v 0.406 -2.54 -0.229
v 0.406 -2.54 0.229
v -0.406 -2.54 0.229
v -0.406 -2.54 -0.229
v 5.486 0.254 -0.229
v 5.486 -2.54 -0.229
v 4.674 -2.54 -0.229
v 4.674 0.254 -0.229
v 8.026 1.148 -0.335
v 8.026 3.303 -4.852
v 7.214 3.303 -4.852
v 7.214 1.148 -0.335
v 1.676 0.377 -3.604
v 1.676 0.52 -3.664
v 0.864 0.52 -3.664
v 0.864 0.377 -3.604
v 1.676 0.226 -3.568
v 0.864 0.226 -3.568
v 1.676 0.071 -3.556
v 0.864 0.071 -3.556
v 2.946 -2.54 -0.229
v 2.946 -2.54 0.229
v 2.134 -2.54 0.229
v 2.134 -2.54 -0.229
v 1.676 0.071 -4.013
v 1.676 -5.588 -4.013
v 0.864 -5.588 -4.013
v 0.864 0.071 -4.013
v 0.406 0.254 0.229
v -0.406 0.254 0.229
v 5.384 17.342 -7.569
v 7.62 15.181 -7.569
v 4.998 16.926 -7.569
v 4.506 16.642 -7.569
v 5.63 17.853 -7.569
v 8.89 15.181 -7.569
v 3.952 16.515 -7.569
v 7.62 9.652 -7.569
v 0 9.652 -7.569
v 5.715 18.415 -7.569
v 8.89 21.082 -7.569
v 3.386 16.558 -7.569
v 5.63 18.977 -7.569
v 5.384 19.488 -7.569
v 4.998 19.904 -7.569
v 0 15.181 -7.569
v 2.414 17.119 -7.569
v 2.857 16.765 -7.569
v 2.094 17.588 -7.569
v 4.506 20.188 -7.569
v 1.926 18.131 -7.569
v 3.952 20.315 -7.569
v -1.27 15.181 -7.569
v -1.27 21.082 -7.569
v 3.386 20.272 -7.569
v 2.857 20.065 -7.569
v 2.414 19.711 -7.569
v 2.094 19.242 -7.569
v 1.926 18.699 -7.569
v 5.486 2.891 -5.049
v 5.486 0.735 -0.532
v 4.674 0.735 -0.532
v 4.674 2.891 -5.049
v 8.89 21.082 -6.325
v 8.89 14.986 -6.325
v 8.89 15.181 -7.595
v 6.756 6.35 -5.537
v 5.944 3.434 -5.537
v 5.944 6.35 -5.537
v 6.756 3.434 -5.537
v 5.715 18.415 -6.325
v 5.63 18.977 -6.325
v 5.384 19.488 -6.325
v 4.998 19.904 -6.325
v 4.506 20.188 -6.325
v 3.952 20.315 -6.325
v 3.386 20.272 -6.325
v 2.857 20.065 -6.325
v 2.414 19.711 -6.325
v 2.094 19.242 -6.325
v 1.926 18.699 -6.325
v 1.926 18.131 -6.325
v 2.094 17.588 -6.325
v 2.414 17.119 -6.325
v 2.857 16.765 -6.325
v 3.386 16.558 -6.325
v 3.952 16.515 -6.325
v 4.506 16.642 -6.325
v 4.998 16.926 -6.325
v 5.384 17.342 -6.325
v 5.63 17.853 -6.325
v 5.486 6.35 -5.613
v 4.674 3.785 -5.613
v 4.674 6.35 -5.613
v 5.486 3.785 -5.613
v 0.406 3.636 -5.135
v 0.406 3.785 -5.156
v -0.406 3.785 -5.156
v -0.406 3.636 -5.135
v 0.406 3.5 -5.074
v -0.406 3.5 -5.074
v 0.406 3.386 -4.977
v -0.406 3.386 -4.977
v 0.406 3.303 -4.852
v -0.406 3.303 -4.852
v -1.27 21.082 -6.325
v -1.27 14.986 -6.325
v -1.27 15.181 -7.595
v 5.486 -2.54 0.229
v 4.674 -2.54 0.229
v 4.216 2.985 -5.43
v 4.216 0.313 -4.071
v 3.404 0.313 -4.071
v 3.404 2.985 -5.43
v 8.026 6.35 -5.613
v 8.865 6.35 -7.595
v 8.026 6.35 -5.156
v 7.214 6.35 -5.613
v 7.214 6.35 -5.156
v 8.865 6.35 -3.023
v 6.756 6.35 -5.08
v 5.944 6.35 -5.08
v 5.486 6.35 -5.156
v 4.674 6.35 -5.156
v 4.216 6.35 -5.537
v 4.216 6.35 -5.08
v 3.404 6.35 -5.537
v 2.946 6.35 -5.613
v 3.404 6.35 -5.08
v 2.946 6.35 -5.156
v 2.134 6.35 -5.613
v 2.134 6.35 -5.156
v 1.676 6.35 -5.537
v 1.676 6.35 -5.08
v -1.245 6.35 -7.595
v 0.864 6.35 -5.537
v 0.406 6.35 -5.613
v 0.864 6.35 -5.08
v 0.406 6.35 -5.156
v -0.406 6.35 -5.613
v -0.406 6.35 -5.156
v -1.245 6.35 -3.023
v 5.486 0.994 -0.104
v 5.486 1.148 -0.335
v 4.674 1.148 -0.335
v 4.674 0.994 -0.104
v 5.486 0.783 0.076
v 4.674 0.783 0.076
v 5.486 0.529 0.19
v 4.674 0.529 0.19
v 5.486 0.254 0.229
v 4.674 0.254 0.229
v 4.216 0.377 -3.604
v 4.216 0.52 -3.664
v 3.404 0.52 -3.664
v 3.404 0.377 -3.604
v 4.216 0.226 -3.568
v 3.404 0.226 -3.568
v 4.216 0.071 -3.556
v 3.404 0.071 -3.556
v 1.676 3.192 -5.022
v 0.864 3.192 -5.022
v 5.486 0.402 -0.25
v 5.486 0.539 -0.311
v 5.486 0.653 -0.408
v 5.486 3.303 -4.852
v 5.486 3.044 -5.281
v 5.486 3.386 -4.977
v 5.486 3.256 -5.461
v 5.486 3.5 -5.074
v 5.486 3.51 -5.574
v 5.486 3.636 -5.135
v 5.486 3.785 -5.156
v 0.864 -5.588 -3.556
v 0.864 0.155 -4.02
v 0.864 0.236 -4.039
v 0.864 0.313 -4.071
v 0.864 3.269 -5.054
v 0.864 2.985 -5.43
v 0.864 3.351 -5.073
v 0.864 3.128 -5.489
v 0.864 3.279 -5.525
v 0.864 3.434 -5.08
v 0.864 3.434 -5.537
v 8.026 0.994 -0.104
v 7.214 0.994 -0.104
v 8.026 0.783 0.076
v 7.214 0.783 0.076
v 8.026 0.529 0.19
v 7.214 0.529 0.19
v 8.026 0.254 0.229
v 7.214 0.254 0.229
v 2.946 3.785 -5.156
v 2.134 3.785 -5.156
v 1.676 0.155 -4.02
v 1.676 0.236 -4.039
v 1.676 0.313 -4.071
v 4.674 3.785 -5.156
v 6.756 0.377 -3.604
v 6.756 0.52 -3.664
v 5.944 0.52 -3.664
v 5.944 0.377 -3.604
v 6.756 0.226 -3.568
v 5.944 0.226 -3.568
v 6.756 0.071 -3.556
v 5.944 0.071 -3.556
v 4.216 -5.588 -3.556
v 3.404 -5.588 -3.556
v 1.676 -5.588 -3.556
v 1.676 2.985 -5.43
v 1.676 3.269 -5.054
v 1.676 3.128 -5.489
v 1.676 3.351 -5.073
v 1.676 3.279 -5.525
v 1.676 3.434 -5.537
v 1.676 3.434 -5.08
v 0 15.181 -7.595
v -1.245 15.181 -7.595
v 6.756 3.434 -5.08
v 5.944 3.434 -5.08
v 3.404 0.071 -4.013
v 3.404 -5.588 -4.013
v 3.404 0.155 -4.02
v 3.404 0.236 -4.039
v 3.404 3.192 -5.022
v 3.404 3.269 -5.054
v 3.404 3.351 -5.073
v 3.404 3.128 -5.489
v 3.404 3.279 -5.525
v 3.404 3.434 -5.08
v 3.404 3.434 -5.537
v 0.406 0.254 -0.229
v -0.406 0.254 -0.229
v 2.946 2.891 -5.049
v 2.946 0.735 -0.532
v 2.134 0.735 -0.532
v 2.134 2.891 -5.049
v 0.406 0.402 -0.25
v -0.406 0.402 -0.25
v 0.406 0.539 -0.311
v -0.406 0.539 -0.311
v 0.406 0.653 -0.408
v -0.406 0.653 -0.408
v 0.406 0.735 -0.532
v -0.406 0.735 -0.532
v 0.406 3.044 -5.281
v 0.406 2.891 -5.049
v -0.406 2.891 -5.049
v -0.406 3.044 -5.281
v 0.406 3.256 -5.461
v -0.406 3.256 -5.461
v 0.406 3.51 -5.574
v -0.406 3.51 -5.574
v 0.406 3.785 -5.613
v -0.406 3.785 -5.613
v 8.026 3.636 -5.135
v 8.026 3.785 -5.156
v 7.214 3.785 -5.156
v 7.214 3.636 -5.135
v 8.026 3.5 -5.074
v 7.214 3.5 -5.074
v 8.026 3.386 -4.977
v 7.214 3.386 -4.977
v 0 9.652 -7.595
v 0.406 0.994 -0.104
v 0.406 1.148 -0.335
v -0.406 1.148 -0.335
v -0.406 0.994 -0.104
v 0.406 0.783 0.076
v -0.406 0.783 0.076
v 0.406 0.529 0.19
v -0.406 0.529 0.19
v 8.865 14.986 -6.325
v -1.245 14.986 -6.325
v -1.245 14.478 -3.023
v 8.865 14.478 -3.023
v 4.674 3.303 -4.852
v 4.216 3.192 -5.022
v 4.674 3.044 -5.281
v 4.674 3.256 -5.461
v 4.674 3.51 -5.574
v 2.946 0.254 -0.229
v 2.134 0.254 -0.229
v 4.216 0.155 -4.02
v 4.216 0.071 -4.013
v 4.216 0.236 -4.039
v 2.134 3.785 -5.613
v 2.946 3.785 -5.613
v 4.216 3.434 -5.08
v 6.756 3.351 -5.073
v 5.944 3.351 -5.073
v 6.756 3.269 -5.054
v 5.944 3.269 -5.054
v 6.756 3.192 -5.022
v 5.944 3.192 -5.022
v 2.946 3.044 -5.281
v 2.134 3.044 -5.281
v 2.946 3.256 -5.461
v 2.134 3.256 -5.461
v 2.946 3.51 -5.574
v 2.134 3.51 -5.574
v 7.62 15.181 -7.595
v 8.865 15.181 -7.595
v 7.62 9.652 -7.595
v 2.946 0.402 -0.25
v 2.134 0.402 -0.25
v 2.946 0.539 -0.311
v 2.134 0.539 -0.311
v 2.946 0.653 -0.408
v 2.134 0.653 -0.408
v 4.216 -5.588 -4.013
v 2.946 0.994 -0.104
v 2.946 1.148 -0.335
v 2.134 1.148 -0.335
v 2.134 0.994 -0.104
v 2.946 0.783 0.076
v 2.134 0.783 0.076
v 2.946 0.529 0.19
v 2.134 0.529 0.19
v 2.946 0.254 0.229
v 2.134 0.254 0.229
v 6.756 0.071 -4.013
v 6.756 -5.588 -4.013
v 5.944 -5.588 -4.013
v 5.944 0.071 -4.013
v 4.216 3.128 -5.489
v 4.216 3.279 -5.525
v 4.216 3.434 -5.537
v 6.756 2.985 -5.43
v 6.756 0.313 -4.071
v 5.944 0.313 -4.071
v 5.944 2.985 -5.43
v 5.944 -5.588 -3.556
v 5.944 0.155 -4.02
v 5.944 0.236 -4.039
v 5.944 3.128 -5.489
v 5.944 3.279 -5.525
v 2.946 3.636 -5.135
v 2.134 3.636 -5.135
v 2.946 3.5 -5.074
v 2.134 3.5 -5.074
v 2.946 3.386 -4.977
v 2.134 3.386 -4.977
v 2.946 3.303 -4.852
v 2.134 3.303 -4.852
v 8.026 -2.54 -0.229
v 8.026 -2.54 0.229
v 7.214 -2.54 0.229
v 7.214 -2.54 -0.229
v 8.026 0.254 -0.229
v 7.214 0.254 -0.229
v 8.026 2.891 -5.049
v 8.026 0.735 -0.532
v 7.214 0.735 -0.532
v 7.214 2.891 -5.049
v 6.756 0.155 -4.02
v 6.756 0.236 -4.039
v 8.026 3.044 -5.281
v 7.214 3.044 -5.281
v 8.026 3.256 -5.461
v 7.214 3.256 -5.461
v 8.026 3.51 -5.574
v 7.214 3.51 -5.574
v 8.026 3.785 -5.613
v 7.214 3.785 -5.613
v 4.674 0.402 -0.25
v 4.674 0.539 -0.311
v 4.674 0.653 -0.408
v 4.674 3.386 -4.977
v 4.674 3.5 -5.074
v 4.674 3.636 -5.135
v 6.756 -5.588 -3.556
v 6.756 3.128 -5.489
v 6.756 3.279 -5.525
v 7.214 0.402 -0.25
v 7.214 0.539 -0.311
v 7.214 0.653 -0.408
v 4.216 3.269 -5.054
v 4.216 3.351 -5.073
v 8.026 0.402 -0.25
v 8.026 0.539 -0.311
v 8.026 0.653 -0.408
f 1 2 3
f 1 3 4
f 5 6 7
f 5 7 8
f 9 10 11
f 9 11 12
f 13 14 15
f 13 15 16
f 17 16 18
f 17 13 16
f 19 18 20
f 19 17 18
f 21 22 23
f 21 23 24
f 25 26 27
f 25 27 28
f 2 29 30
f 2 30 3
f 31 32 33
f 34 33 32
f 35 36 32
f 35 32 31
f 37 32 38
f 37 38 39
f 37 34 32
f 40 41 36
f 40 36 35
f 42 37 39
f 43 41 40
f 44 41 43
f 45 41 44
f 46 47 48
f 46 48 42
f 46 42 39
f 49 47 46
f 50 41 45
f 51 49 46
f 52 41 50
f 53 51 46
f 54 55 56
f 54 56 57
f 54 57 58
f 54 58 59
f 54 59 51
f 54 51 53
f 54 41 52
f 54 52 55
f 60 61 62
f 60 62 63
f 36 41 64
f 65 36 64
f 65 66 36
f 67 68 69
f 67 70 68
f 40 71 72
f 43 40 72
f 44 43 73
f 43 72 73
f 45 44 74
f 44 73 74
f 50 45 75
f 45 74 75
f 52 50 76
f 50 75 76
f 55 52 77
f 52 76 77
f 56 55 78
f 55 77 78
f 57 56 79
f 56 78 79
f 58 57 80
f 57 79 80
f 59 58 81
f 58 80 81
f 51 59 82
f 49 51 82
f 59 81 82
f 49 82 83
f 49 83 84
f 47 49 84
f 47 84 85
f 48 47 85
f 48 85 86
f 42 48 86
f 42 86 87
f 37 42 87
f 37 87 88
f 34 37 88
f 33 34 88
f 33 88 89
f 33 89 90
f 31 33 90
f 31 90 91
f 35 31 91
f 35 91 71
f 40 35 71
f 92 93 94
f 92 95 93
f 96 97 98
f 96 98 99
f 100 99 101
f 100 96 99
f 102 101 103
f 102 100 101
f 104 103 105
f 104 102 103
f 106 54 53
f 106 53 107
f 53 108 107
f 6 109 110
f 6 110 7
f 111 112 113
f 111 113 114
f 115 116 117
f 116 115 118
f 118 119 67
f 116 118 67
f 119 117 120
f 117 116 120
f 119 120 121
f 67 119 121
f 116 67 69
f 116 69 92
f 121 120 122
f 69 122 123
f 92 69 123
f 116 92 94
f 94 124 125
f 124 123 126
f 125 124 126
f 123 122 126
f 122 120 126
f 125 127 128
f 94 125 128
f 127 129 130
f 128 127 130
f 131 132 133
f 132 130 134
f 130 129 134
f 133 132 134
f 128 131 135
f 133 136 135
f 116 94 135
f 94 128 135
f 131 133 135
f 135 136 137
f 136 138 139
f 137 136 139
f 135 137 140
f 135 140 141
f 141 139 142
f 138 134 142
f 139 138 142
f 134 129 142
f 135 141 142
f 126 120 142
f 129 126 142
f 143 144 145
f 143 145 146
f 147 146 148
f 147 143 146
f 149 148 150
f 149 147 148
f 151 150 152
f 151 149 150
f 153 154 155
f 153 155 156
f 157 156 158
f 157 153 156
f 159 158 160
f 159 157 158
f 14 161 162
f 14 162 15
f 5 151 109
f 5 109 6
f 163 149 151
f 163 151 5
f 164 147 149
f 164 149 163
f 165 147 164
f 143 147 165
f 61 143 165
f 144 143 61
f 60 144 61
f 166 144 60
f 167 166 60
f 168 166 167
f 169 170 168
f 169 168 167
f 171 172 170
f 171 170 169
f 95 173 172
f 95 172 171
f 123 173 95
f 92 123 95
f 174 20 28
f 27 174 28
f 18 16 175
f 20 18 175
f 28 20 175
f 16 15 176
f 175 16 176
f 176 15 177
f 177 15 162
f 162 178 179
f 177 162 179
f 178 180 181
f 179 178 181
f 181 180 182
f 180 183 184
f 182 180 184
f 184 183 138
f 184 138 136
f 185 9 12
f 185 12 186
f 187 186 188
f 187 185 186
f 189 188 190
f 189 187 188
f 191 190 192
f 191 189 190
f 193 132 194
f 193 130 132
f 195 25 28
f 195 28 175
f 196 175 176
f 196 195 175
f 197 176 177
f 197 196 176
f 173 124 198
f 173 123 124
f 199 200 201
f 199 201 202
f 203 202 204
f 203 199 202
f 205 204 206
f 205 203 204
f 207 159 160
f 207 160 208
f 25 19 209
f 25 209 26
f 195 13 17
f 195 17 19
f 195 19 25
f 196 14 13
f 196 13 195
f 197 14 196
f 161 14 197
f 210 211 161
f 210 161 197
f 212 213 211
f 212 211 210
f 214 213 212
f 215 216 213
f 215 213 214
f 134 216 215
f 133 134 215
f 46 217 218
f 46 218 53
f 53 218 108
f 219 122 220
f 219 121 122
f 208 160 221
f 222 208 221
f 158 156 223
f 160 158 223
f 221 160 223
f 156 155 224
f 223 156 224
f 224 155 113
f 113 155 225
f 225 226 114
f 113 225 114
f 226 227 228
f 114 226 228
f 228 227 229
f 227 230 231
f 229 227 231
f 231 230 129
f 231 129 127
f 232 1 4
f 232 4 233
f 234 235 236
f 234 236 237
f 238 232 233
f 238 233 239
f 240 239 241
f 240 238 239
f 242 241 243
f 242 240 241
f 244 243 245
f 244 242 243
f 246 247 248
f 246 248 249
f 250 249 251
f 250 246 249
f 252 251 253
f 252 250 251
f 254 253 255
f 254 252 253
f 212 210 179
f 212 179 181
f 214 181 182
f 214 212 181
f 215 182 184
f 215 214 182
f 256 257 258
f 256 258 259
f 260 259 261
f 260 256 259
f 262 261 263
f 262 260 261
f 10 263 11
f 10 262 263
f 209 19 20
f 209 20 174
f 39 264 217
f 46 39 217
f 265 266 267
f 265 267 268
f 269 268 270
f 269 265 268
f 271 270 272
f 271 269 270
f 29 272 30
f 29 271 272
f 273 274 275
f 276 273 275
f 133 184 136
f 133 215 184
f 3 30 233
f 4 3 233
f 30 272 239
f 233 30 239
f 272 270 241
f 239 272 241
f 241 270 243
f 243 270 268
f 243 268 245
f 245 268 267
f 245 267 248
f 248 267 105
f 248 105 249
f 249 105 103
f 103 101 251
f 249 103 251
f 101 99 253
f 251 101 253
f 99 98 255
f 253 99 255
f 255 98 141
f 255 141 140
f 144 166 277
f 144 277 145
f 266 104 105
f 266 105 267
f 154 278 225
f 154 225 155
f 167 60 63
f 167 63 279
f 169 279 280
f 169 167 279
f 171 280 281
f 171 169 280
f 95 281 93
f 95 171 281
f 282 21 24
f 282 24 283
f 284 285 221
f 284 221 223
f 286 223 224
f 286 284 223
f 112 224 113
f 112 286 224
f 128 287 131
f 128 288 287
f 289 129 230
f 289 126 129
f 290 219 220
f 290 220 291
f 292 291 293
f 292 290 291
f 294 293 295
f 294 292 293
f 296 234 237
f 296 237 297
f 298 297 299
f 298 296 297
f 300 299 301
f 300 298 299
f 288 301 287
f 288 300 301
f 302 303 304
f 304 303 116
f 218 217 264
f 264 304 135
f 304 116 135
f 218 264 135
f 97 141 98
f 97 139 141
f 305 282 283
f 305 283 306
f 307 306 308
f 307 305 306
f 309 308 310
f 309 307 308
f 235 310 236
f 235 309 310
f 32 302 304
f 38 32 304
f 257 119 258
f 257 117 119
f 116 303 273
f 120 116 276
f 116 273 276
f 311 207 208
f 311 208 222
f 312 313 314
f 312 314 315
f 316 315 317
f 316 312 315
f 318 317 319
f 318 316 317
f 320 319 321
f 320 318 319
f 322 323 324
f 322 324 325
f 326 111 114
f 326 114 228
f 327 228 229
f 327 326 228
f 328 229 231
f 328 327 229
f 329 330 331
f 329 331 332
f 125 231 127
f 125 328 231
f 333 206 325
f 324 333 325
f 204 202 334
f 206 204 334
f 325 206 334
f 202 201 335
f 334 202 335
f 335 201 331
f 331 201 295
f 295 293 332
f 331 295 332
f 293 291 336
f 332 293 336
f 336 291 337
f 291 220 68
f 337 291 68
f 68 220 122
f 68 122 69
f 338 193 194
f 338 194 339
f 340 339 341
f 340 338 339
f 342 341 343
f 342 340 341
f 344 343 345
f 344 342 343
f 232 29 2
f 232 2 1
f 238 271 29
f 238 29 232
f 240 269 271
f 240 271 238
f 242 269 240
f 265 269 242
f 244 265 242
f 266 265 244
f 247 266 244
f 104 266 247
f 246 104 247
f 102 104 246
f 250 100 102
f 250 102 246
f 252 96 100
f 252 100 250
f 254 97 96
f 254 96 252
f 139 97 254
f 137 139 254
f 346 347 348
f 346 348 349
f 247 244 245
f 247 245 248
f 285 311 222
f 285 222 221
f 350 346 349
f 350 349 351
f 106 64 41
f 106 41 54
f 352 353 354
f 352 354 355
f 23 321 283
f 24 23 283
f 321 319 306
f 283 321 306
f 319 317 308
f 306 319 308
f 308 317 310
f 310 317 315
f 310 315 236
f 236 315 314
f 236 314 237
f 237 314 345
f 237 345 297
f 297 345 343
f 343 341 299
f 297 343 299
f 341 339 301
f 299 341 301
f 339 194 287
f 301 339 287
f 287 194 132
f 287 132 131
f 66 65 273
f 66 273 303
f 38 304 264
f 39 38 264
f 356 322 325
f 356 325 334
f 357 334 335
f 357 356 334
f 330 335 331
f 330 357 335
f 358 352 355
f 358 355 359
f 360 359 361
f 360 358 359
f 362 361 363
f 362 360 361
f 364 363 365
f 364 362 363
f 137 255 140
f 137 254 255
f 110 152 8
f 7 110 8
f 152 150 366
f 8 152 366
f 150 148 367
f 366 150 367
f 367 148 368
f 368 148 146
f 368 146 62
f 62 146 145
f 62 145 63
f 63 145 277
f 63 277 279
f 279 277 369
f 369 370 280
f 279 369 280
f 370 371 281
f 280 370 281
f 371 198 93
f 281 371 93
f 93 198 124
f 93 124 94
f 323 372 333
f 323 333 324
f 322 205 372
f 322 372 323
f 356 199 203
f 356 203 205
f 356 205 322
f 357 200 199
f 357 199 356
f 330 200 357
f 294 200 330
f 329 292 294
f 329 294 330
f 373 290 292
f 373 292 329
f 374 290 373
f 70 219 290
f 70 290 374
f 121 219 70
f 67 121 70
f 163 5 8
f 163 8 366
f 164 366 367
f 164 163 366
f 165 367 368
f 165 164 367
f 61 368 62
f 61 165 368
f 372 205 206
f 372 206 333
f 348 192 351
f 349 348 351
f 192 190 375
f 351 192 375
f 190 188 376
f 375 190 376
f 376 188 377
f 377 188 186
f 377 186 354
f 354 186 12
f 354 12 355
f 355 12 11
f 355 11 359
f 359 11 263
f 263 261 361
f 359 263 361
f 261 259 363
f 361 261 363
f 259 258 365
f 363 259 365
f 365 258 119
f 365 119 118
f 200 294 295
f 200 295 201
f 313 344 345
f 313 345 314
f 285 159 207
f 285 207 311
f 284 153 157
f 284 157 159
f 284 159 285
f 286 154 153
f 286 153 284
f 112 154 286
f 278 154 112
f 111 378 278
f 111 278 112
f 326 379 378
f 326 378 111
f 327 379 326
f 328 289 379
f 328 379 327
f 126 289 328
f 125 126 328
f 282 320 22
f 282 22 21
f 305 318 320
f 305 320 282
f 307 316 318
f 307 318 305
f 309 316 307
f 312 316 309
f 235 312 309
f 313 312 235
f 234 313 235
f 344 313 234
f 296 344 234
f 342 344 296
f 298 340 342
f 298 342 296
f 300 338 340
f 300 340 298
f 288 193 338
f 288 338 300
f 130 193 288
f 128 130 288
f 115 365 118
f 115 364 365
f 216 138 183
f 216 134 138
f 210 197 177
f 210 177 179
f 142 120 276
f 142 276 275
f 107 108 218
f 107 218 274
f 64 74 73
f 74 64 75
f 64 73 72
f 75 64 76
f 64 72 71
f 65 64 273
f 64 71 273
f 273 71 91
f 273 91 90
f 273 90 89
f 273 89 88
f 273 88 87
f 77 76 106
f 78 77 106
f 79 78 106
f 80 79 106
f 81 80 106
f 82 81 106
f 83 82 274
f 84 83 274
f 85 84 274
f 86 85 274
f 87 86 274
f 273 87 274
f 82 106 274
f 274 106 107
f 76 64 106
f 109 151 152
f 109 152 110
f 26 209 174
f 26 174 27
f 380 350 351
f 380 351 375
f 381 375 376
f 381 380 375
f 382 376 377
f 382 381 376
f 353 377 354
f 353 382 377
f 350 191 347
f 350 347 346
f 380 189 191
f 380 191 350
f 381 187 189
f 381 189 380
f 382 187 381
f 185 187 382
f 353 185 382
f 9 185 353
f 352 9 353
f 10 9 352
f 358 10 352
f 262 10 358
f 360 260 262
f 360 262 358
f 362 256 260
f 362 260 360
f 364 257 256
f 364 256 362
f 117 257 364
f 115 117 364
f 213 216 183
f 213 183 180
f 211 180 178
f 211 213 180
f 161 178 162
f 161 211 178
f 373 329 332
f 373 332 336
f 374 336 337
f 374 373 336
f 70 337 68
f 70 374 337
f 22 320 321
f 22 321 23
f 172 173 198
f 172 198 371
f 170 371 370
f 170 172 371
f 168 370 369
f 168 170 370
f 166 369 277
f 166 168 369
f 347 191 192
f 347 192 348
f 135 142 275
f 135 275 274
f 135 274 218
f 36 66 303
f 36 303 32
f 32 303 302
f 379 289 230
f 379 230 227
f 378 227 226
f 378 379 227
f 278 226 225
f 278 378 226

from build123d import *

# Parameters (mm, degrees)
SKETCH2_W                = 10.16
SKETCH2_H                = 4.572
BASE_EXTRUDE_DEPTH       = 14.732
CUT_EXTRUDE1_DEPTH       = 1
CUT_EXTRUDE1_DEPTH_BACK  = 11.16
CUT_EXTRUDE4_DEPTH       = 0.0254
CUT_EXTRUDE5_DEPTH       = 0.0254
CUT_EXTRUDE6_DEPTH       = 0.0254
BOSS_EXTRUDE_THIN1_DEPTH = 0.4064
LPATTERN2_COUNT          = 4
LPATTERN2_PITCH          = 2.54
BOSS_EXTRUDE_THIN2_DEPTH = 0.4064
LPATTERN3_COUNT          = 3
LPATTERN3_PITCH          = 2.54
SKETCH4_R                = 1.905
CUT_EXTRUDE2_DEPTH       = 14.732


with BuildPart() as part:
    # Sketch2 → Base-Extrude (new body)
    with BuildSketch(Plane(origin=(0, 6.35, 0), x_dir=(-1, 0, 0), z_dir=(0, 1, 0))):
        with Locations((-3.81, -5.3086)):
            Rectangle(SKETCH2_W, SKETCH2_H)
    extrude(amount=BASE_EXTRUDE_DEPTH)

    # Sketch3 → Cut-Extrude1 (cut, two sides)
    with BuildSketch(Plane.ZY.offset(1.27)) as cut_extrude1_sk:
        Polygon((-6.3246, 21.082), (-6.3246, 14.986), (-3.0226, 14.478), (-3.0226, 21.082), align=None)
    extrude(amount=CUT_EXTRUDE1_DEPTH, mode=Mode.SUBTRACT)
    extrude(cut_extrude1_sk.sketch, amount=-CUT_EXTRUDE1_DEPTH_BACK, mode=Mode.SUBTRACT)

    # Sketch5 → Cut-Extrude4 (cut)
    with BuildSketch(Plane.ZY.offset(1.27)):
        Polygon((-7.5946, 15.181384615), (-3.0226, 14.478), (-3.0226, 6.35), (-7.5946, 6.35), align=None)
    extrude(amount=-CUT_EXTRUDE4_DEPTH, mode=Mode.SUBTRACT)

    # Sketch6 → Cut-Extrude5 (cut)
    with BuildSketch(Plane(origin=(8.89, 0, 0), x_dir=(0, 0, -1), z_dir=(1, 0, 0))):
        Polygon((3.0226, 14.478), (7.5946, 15.181384615), (7.5946, 6.35), (3.0226, 6.35), align=None)
    extrude(amount=-CUT_EXTRUDE5_DEPTH, mode=Mode.SUBTRACT)

    # Sketch7 → Cut-Extrude6 (cut)
    with BuildSketch(Plane(origin=(0, 0, -7.5946), x_dir=(-1, 0, 0), z_dir=(0, 0, -1))):
        Polygon((-8.89, 21.082), (-8.89, 15.181384615), (-7.62, 15.181384615), (-7.62, 9.652), (0, 9.652), (0, 15.181384615), (1.27, 15.181384615), (1.27, 21.082), align=None)
    extrude(amount=-CUT_EXTRUDE6_DEPTH, mode=Mode.SUBTRACT)

    # Sketch9 → Boss-Extrude-Thin1 (add, symmetric)
    with BuildSketch(Plane(origin=(0, 0, 0), x_dir=(0, 0, -1), z_dir=(1, 0, 0))):
        with BuildLine():
            Line((5.1562, 6.35), (5.1562, 3.7846))
            ThreePointArc((5.1562, 3.7846), (5.07392687, 3.499994822), (4.852487561, 3.303186265))
            Line((4.852487561, 3.303186265), (0.335437388, 1.14805408))
            ThreePointArc((0.335437388, 1.14805408), (-0.075807043, 0.782552474), (-0.2286, 0.254))
            Line((-0.2286, 0.254), (-0.2286, -2.54))
            Line((-0.2286, -2.54), (0.2286, -2.54))
            Line((0.2286, -2.54), (0.2286, 0.254))
            ThreePointArc((0.2286, 0.254), (0.31087313, 0.538605178), (0.532312439, 0.735413735))
            Line((0.532312439, 0.735413735), (5.049362612, 2.89054592))
            ThreePointArc((5.049362612, 2.89054592), (5.460607043, 3.256047526), (5.6134, 3.7846))
            Line((5.6134, 3.7846), (5.6134, 6.35))
            Line((5.6134, 6.35), (5.1562, 6.35))
        make_face()
    boss_extrude_thin1 = extrude(amount=BOSS_EXTRUDE_THIN1_DEPTH, both=True)

    # LPattern2: Boss-Extrude-Thin1 ×4
    with Locations(*[(i * LPATTERN2_PITCH, 0, 0) for i in range(1, LPATTERN2_COUNT)]):
        add(boss_extrude_thin1)

    # Sketch10 → Boss-Extrude-Thin2 (add, symmetric)
    with BuildSketch(Plane(origin=(1.27, 0, 0), x_dir=(0, 0, -1), z_dir=(1, 0, 0))):
        with BuildLine():
            Line((5.08, 6.35), (5.08, 3.433803724))
            ThreePointArc((5.08, 3.433803724), (5.065314035, 3.309500424), (5.022064828, 3.192041946))
            Line((5.022064828, 3.192041946), (3.66359389, 0.520382434))
            ThreePointArc((3.66359389, 0.520382434), (3.583273936, 0.302245261), (3.556, 0.071396276))
            Line((3.556, 0.071396276), (3.556, -5.588))
            Line((3.556, -5.588), (4.0132, -5.588))
            Line((4.0132, -5.588), (4.0132, 0.071396276))
            ThreePointArc((4.0132, 0.071396276), (4.027885965, 0.195699576), (4.071135172, 0.313158054))
            Line((4.071135172, 0.313158054), (5.42960611, 2.984817566))
            ThreePointArc((5.42960611, 2.984817566), (5.509926064, 3.202954739), (5.5372, 3.433803724))
            Line((5.5372, 3.433803724), (5.5372, 6.35))
            Line((5.5372, 6.35), (5.08, 6.35))
        make_face()
    boss_extrude_thin2 = extrude(amount=BOSS_EXTRUDE_THIN2_DEPTH, both=True)

    # LPattern3: Boss-Extrude-Thin2 ×3
    with Locations(*[(i * LPATTERN3_PITCH, 0, 0) for i in range(1, LPATTERN3_COUNT)]):
        add(boss_extrude_thin2)

    # Sketch4 → Cut-Extrude2 (cut)
    with BuildSketch(Plane.XY.offset(-6.3246)):
        with Locations((3.81, 18.415)):
            Circle(SKETCH4_R)
    extrude(amount=-CUT_EXTRUDE2_DEPTH, mode=Mode.SUBTRACT)


solid = part.part
